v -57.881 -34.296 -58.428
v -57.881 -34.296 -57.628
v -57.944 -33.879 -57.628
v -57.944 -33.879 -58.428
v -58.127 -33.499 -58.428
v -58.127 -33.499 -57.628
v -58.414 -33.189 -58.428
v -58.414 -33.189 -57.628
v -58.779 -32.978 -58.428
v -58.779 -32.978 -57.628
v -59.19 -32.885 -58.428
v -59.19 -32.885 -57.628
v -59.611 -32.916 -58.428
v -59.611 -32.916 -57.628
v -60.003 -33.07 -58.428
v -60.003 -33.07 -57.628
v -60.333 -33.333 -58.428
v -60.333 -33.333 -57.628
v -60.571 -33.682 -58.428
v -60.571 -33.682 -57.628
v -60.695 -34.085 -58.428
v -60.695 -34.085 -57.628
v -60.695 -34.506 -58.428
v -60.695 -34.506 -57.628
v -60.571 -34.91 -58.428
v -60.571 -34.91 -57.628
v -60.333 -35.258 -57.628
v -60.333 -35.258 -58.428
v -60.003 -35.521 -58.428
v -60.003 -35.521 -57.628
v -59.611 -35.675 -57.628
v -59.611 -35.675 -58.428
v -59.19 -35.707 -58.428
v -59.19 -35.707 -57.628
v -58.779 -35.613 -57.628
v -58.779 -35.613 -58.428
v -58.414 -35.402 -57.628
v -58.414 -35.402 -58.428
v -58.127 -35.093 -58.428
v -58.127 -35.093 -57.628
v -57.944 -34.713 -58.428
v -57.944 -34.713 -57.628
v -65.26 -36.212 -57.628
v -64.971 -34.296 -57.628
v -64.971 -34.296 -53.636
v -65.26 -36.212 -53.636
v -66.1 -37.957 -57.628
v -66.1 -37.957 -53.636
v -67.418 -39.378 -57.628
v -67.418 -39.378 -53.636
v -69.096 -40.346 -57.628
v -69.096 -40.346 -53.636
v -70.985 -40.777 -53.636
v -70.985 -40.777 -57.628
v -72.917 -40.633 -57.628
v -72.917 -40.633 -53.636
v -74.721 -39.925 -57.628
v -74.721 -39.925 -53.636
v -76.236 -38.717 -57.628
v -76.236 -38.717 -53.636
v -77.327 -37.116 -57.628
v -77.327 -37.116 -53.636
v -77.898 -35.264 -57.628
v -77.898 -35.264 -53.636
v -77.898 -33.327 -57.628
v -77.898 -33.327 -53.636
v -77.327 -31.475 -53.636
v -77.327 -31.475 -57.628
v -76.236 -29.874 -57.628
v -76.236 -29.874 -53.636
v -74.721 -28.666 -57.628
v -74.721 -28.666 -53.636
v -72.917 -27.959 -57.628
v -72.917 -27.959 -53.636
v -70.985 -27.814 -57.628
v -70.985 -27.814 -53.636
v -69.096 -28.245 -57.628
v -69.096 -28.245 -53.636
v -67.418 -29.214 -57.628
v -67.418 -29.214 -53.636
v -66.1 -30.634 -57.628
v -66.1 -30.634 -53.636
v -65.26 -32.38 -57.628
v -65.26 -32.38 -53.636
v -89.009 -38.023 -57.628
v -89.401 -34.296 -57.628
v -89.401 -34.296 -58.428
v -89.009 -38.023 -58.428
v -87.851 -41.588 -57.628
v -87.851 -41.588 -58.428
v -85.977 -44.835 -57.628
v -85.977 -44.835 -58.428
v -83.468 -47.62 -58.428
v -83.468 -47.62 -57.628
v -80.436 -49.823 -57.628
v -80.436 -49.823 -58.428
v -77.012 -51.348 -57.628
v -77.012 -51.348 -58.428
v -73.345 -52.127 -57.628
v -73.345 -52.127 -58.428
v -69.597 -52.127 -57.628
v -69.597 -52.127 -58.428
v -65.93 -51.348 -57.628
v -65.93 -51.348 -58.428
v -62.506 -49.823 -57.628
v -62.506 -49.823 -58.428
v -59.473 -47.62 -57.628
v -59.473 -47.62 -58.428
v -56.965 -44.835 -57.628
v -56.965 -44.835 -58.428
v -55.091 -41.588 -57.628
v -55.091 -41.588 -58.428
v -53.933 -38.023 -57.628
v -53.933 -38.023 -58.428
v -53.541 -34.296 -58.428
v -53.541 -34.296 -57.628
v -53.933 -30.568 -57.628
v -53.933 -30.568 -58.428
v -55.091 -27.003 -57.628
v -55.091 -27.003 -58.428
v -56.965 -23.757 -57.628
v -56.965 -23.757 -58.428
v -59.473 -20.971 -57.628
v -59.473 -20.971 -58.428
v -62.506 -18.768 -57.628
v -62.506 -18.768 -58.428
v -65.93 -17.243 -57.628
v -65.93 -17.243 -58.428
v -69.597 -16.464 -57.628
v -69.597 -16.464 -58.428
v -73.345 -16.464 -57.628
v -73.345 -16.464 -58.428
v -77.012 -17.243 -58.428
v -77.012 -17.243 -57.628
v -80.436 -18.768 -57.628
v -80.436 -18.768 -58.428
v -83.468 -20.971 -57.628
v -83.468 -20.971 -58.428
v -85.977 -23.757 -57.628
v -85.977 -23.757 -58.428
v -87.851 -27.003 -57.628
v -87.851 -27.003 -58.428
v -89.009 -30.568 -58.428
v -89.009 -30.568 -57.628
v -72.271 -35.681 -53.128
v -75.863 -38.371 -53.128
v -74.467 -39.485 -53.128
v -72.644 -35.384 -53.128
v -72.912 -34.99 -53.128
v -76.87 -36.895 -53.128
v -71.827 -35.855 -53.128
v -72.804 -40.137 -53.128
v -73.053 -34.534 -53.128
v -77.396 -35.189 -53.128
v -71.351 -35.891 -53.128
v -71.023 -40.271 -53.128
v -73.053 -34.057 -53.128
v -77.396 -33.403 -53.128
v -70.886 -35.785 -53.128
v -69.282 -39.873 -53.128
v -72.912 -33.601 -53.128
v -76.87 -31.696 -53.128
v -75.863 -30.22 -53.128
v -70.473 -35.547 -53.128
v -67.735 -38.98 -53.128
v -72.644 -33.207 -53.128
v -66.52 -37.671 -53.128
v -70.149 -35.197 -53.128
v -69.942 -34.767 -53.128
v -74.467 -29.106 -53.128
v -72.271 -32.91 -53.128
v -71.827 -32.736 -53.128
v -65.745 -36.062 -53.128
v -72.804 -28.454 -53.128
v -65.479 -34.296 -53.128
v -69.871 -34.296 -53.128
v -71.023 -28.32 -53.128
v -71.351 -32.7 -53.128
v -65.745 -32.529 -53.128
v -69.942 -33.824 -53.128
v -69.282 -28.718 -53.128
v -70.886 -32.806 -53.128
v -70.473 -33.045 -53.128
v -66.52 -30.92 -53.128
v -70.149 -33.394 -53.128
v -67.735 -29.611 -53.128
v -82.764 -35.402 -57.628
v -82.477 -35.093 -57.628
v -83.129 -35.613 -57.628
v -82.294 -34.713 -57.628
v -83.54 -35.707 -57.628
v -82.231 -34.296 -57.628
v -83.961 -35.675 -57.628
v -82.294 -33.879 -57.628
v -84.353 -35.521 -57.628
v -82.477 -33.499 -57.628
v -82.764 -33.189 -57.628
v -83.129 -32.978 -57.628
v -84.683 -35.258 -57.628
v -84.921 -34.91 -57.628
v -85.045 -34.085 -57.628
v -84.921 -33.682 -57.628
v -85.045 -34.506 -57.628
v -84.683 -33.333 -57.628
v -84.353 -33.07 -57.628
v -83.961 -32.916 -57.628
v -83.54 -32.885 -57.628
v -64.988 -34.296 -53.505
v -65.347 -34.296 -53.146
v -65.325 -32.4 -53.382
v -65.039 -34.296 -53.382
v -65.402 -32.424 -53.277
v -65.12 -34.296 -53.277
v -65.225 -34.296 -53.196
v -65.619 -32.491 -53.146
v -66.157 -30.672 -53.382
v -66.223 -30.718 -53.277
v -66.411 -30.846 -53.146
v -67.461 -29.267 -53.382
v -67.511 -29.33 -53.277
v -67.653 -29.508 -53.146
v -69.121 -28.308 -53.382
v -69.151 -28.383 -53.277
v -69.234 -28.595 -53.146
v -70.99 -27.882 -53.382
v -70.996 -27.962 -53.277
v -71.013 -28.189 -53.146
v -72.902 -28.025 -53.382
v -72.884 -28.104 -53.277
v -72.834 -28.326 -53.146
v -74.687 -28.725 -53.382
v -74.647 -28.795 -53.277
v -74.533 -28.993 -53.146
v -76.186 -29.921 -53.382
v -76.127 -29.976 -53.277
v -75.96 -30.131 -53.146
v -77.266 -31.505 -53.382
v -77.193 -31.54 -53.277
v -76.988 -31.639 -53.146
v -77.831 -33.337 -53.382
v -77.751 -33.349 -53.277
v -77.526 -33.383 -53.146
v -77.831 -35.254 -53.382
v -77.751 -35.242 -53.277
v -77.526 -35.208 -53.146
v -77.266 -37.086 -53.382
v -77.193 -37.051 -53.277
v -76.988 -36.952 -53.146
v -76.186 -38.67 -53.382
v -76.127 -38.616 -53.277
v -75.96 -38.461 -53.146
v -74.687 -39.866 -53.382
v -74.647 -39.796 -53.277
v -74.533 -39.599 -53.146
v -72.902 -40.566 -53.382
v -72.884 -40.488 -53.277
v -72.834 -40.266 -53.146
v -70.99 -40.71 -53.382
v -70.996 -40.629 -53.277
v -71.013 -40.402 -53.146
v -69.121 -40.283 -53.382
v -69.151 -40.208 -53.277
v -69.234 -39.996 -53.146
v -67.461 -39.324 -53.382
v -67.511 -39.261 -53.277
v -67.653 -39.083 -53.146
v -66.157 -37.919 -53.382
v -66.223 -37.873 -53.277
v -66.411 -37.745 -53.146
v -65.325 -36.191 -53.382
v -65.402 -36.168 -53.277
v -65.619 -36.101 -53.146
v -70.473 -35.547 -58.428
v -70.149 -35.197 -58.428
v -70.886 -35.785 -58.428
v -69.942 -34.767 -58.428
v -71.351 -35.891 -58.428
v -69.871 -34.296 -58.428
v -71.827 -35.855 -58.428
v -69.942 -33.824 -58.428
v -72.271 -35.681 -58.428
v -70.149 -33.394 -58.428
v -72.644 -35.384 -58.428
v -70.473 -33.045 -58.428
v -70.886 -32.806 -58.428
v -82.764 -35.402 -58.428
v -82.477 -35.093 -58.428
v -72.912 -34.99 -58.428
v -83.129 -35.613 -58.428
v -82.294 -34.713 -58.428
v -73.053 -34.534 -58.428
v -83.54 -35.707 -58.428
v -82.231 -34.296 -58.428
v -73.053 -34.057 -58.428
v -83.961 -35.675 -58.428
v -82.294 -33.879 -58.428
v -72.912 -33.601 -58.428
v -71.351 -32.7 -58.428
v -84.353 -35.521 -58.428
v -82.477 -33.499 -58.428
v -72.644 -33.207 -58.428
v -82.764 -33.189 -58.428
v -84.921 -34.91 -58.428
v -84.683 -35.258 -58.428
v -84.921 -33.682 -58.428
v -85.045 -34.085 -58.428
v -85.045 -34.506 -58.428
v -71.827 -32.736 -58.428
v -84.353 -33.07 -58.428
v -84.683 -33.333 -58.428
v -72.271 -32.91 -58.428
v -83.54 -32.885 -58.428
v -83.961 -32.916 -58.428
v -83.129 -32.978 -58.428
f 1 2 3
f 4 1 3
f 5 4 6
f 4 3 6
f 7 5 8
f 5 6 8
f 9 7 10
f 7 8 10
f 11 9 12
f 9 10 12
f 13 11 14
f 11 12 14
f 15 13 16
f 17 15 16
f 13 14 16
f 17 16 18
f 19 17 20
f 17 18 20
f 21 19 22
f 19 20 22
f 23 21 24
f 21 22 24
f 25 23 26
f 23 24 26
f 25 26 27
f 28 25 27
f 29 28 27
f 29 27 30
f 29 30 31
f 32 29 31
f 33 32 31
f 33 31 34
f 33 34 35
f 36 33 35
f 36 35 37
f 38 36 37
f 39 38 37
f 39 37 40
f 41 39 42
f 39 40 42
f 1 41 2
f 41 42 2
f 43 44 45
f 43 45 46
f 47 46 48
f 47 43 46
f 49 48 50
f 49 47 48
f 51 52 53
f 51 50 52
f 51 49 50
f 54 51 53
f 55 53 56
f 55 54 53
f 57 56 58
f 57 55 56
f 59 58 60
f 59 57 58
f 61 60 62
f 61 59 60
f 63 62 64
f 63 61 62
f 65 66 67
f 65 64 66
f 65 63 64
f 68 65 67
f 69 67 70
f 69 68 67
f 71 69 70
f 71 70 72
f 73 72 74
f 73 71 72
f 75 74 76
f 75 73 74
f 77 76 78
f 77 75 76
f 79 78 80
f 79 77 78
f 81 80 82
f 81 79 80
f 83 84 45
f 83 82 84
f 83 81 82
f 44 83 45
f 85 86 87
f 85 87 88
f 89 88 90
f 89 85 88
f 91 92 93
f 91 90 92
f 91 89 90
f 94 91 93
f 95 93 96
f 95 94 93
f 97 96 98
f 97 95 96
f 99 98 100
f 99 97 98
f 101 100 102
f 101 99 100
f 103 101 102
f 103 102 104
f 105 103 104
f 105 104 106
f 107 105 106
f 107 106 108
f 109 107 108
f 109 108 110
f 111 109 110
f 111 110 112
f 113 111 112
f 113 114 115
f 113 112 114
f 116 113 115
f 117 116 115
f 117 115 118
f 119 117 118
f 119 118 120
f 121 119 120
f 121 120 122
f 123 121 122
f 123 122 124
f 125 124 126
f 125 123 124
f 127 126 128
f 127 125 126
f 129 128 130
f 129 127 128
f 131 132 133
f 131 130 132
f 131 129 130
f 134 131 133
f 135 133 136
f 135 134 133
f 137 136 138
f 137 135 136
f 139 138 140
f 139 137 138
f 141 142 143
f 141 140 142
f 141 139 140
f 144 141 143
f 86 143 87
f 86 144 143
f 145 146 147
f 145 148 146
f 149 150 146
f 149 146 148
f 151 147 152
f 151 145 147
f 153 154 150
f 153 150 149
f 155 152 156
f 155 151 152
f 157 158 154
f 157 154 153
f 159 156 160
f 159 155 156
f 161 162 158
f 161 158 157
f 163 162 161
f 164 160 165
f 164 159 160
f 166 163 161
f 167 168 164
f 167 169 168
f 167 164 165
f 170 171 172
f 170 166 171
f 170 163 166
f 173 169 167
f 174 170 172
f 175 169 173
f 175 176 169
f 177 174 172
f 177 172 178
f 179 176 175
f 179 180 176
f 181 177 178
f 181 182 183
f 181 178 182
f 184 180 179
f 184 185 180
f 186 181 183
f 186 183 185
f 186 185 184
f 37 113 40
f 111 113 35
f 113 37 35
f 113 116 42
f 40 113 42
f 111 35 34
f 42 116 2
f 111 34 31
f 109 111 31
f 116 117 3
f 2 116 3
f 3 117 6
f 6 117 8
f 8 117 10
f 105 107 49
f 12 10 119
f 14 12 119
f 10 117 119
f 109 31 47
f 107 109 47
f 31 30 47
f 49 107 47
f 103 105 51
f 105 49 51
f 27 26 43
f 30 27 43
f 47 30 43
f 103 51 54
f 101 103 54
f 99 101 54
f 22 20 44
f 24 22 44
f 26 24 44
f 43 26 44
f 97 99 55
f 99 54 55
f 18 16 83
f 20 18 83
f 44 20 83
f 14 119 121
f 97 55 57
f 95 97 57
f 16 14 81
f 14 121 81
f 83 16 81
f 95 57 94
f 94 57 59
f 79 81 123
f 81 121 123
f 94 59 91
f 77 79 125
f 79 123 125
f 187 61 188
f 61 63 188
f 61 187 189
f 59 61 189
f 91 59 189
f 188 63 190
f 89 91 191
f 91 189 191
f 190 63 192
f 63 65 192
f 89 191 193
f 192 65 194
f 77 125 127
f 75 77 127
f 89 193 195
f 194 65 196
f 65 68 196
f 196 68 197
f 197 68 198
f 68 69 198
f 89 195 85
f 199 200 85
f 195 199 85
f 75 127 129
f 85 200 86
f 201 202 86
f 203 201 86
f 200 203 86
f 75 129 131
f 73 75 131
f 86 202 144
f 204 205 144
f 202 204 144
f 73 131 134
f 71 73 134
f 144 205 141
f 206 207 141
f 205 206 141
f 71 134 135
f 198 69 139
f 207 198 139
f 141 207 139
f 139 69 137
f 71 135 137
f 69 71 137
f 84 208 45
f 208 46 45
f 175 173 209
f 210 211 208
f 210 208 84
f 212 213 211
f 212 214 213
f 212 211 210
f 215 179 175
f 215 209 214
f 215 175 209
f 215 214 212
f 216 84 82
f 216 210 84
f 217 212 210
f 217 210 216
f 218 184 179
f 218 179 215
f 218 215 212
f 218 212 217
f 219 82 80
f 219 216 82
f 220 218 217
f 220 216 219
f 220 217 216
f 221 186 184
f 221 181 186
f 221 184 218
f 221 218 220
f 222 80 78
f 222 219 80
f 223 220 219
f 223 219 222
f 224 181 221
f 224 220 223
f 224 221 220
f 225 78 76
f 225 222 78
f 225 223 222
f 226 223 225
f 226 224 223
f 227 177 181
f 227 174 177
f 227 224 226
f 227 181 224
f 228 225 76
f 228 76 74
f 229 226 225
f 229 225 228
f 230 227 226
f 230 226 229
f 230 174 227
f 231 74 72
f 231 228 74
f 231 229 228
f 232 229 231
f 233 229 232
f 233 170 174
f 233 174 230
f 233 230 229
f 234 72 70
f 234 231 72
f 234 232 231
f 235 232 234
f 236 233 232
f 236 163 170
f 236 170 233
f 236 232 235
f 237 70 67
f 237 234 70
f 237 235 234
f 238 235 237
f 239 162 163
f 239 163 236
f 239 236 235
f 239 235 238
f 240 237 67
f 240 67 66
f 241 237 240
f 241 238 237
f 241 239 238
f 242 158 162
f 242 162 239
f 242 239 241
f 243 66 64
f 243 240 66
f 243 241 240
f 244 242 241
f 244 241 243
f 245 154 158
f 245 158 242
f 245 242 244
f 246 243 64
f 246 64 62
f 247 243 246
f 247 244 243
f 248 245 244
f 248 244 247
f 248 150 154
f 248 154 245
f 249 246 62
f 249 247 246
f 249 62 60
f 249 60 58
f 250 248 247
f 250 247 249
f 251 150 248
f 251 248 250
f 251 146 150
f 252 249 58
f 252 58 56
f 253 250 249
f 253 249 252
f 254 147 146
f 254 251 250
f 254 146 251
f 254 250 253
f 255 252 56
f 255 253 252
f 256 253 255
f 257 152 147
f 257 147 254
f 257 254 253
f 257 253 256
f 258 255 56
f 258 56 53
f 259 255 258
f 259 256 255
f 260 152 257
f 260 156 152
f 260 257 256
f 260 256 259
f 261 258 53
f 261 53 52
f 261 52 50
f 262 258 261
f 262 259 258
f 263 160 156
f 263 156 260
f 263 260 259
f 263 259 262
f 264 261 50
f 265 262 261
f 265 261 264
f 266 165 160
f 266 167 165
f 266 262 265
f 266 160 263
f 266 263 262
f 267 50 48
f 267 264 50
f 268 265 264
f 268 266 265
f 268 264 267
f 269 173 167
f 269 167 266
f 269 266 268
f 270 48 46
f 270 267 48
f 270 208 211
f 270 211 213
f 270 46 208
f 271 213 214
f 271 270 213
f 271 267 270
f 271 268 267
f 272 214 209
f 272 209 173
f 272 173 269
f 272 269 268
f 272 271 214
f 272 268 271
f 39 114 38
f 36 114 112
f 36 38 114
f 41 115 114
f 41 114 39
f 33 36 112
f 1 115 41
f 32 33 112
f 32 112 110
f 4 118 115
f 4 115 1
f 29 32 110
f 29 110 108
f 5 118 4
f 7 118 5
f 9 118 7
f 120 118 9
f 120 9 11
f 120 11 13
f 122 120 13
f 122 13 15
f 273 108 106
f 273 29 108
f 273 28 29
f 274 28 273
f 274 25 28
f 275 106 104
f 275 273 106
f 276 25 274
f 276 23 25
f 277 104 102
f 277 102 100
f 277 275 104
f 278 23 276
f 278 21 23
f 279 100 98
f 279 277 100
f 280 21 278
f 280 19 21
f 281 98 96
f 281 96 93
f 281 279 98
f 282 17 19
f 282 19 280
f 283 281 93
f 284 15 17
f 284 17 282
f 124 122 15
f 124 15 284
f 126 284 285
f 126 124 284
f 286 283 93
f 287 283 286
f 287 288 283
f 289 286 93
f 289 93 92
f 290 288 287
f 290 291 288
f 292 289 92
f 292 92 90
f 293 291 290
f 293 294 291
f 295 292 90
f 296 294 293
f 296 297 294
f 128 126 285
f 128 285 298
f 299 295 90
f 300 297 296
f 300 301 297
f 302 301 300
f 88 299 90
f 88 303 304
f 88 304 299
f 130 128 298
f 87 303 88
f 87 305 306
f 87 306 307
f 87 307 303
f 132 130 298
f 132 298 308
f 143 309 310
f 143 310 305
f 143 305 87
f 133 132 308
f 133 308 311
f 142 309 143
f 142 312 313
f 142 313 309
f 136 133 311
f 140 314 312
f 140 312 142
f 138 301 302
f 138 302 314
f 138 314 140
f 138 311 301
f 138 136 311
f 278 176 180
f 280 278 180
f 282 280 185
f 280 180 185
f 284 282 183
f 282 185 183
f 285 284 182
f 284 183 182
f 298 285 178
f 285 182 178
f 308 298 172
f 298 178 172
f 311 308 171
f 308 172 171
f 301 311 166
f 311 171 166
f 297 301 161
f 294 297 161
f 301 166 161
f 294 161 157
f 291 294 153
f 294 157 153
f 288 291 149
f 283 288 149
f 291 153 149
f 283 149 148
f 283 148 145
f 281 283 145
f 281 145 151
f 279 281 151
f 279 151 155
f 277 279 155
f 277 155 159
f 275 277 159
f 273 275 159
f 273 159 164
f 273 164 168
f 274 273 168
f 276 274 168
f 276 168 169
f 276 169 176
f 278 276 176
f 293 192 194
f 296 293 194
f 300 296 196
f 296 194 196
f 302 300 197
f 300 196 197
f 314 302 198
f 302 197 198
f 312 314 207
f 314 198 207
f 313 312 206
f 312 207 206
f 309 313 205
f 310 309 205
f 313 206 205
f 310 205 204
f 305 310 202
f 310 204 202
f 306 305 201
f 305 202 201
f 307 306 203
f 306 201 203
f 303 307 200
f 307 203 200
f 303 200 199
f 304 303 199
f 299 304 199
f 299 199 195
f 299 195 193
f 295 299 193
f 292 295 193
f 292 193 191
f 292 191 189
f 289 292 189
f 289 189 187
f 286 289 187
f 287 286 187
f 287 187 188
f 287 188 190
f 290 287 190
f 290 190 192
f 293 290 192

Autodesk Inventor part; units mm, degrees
ref_plane "YZ Plane" through (0, 0, 0) normal (1, 0, 0) x (0, 1, 0)
ref_plane "XY Plane" through (0, 0, 0) normal (0, 0, 1) x (1, 0, 0)
ref_plane "Work Plane1" through (-71.4709, -34.2956, -57.6282) normal (0, 0, -1) x (-1, 0, 0)
sketch "Sketch1" plane through (-71.4709, -34.2956, -57.6282) normal (0, 0, -1) x (-1, 0, 0)
  circle A0 centre (0, 0) radius 17.93 projected
  point P0 (-71.4709, 34.2956)
extrude "Extrusion1" add sketch "Sketch1" along normal blind 0.8
sketch "Sketch2" plane through (-71.4709, -34.2956, -57.6282) normal (0, 0, 1) x (1, 0, 0)
  circle A0 centre (0, 0) radius 12.175 construction
  circle A1 centre (12.175, 0) radius 1.415
  circle A2 centre (-12.175, 0) radius 1.415
  point P0 (71.4709, 34.2956)
  dimension "d2" = 24.35
  dimension "d3" = 2.83
  dimension "d4" = 2.83
extrude "Extrusion2" cut sketch "Sketch2" against normal blind 0.8
sketch "Sketch3" plane through (-71.4709, -34.2956, -57.6282) normal (0, 0, 1) x (1, 0, 0)
  circle A0 centre (0, 0) radius 6.5
  point P0 (71.4709, 34.2956)
  dimension "d7" = 13
extrude "Extrusion3" add sketch "Sketch3" along normal blind 4.5
fillet "Fillet1" radius 0.508 1 edges at (-77.9709, -34.2956, -53.1282)
sketch "Sketch4" plane through (-71.4709, -34.2956, -53.1282) normal (0, 0, 1) x (1, 0, 0)
  circle A0 centre (0, 0) radius 1.6
  point P0 (71.4709, 34.2956)
  dimension "d11" = 3.2
extrude "Extrusion4" cut sketch "Sketch4" against normal blind 19.2875
properties part number "capot_inf" material "Iron, Cast"
